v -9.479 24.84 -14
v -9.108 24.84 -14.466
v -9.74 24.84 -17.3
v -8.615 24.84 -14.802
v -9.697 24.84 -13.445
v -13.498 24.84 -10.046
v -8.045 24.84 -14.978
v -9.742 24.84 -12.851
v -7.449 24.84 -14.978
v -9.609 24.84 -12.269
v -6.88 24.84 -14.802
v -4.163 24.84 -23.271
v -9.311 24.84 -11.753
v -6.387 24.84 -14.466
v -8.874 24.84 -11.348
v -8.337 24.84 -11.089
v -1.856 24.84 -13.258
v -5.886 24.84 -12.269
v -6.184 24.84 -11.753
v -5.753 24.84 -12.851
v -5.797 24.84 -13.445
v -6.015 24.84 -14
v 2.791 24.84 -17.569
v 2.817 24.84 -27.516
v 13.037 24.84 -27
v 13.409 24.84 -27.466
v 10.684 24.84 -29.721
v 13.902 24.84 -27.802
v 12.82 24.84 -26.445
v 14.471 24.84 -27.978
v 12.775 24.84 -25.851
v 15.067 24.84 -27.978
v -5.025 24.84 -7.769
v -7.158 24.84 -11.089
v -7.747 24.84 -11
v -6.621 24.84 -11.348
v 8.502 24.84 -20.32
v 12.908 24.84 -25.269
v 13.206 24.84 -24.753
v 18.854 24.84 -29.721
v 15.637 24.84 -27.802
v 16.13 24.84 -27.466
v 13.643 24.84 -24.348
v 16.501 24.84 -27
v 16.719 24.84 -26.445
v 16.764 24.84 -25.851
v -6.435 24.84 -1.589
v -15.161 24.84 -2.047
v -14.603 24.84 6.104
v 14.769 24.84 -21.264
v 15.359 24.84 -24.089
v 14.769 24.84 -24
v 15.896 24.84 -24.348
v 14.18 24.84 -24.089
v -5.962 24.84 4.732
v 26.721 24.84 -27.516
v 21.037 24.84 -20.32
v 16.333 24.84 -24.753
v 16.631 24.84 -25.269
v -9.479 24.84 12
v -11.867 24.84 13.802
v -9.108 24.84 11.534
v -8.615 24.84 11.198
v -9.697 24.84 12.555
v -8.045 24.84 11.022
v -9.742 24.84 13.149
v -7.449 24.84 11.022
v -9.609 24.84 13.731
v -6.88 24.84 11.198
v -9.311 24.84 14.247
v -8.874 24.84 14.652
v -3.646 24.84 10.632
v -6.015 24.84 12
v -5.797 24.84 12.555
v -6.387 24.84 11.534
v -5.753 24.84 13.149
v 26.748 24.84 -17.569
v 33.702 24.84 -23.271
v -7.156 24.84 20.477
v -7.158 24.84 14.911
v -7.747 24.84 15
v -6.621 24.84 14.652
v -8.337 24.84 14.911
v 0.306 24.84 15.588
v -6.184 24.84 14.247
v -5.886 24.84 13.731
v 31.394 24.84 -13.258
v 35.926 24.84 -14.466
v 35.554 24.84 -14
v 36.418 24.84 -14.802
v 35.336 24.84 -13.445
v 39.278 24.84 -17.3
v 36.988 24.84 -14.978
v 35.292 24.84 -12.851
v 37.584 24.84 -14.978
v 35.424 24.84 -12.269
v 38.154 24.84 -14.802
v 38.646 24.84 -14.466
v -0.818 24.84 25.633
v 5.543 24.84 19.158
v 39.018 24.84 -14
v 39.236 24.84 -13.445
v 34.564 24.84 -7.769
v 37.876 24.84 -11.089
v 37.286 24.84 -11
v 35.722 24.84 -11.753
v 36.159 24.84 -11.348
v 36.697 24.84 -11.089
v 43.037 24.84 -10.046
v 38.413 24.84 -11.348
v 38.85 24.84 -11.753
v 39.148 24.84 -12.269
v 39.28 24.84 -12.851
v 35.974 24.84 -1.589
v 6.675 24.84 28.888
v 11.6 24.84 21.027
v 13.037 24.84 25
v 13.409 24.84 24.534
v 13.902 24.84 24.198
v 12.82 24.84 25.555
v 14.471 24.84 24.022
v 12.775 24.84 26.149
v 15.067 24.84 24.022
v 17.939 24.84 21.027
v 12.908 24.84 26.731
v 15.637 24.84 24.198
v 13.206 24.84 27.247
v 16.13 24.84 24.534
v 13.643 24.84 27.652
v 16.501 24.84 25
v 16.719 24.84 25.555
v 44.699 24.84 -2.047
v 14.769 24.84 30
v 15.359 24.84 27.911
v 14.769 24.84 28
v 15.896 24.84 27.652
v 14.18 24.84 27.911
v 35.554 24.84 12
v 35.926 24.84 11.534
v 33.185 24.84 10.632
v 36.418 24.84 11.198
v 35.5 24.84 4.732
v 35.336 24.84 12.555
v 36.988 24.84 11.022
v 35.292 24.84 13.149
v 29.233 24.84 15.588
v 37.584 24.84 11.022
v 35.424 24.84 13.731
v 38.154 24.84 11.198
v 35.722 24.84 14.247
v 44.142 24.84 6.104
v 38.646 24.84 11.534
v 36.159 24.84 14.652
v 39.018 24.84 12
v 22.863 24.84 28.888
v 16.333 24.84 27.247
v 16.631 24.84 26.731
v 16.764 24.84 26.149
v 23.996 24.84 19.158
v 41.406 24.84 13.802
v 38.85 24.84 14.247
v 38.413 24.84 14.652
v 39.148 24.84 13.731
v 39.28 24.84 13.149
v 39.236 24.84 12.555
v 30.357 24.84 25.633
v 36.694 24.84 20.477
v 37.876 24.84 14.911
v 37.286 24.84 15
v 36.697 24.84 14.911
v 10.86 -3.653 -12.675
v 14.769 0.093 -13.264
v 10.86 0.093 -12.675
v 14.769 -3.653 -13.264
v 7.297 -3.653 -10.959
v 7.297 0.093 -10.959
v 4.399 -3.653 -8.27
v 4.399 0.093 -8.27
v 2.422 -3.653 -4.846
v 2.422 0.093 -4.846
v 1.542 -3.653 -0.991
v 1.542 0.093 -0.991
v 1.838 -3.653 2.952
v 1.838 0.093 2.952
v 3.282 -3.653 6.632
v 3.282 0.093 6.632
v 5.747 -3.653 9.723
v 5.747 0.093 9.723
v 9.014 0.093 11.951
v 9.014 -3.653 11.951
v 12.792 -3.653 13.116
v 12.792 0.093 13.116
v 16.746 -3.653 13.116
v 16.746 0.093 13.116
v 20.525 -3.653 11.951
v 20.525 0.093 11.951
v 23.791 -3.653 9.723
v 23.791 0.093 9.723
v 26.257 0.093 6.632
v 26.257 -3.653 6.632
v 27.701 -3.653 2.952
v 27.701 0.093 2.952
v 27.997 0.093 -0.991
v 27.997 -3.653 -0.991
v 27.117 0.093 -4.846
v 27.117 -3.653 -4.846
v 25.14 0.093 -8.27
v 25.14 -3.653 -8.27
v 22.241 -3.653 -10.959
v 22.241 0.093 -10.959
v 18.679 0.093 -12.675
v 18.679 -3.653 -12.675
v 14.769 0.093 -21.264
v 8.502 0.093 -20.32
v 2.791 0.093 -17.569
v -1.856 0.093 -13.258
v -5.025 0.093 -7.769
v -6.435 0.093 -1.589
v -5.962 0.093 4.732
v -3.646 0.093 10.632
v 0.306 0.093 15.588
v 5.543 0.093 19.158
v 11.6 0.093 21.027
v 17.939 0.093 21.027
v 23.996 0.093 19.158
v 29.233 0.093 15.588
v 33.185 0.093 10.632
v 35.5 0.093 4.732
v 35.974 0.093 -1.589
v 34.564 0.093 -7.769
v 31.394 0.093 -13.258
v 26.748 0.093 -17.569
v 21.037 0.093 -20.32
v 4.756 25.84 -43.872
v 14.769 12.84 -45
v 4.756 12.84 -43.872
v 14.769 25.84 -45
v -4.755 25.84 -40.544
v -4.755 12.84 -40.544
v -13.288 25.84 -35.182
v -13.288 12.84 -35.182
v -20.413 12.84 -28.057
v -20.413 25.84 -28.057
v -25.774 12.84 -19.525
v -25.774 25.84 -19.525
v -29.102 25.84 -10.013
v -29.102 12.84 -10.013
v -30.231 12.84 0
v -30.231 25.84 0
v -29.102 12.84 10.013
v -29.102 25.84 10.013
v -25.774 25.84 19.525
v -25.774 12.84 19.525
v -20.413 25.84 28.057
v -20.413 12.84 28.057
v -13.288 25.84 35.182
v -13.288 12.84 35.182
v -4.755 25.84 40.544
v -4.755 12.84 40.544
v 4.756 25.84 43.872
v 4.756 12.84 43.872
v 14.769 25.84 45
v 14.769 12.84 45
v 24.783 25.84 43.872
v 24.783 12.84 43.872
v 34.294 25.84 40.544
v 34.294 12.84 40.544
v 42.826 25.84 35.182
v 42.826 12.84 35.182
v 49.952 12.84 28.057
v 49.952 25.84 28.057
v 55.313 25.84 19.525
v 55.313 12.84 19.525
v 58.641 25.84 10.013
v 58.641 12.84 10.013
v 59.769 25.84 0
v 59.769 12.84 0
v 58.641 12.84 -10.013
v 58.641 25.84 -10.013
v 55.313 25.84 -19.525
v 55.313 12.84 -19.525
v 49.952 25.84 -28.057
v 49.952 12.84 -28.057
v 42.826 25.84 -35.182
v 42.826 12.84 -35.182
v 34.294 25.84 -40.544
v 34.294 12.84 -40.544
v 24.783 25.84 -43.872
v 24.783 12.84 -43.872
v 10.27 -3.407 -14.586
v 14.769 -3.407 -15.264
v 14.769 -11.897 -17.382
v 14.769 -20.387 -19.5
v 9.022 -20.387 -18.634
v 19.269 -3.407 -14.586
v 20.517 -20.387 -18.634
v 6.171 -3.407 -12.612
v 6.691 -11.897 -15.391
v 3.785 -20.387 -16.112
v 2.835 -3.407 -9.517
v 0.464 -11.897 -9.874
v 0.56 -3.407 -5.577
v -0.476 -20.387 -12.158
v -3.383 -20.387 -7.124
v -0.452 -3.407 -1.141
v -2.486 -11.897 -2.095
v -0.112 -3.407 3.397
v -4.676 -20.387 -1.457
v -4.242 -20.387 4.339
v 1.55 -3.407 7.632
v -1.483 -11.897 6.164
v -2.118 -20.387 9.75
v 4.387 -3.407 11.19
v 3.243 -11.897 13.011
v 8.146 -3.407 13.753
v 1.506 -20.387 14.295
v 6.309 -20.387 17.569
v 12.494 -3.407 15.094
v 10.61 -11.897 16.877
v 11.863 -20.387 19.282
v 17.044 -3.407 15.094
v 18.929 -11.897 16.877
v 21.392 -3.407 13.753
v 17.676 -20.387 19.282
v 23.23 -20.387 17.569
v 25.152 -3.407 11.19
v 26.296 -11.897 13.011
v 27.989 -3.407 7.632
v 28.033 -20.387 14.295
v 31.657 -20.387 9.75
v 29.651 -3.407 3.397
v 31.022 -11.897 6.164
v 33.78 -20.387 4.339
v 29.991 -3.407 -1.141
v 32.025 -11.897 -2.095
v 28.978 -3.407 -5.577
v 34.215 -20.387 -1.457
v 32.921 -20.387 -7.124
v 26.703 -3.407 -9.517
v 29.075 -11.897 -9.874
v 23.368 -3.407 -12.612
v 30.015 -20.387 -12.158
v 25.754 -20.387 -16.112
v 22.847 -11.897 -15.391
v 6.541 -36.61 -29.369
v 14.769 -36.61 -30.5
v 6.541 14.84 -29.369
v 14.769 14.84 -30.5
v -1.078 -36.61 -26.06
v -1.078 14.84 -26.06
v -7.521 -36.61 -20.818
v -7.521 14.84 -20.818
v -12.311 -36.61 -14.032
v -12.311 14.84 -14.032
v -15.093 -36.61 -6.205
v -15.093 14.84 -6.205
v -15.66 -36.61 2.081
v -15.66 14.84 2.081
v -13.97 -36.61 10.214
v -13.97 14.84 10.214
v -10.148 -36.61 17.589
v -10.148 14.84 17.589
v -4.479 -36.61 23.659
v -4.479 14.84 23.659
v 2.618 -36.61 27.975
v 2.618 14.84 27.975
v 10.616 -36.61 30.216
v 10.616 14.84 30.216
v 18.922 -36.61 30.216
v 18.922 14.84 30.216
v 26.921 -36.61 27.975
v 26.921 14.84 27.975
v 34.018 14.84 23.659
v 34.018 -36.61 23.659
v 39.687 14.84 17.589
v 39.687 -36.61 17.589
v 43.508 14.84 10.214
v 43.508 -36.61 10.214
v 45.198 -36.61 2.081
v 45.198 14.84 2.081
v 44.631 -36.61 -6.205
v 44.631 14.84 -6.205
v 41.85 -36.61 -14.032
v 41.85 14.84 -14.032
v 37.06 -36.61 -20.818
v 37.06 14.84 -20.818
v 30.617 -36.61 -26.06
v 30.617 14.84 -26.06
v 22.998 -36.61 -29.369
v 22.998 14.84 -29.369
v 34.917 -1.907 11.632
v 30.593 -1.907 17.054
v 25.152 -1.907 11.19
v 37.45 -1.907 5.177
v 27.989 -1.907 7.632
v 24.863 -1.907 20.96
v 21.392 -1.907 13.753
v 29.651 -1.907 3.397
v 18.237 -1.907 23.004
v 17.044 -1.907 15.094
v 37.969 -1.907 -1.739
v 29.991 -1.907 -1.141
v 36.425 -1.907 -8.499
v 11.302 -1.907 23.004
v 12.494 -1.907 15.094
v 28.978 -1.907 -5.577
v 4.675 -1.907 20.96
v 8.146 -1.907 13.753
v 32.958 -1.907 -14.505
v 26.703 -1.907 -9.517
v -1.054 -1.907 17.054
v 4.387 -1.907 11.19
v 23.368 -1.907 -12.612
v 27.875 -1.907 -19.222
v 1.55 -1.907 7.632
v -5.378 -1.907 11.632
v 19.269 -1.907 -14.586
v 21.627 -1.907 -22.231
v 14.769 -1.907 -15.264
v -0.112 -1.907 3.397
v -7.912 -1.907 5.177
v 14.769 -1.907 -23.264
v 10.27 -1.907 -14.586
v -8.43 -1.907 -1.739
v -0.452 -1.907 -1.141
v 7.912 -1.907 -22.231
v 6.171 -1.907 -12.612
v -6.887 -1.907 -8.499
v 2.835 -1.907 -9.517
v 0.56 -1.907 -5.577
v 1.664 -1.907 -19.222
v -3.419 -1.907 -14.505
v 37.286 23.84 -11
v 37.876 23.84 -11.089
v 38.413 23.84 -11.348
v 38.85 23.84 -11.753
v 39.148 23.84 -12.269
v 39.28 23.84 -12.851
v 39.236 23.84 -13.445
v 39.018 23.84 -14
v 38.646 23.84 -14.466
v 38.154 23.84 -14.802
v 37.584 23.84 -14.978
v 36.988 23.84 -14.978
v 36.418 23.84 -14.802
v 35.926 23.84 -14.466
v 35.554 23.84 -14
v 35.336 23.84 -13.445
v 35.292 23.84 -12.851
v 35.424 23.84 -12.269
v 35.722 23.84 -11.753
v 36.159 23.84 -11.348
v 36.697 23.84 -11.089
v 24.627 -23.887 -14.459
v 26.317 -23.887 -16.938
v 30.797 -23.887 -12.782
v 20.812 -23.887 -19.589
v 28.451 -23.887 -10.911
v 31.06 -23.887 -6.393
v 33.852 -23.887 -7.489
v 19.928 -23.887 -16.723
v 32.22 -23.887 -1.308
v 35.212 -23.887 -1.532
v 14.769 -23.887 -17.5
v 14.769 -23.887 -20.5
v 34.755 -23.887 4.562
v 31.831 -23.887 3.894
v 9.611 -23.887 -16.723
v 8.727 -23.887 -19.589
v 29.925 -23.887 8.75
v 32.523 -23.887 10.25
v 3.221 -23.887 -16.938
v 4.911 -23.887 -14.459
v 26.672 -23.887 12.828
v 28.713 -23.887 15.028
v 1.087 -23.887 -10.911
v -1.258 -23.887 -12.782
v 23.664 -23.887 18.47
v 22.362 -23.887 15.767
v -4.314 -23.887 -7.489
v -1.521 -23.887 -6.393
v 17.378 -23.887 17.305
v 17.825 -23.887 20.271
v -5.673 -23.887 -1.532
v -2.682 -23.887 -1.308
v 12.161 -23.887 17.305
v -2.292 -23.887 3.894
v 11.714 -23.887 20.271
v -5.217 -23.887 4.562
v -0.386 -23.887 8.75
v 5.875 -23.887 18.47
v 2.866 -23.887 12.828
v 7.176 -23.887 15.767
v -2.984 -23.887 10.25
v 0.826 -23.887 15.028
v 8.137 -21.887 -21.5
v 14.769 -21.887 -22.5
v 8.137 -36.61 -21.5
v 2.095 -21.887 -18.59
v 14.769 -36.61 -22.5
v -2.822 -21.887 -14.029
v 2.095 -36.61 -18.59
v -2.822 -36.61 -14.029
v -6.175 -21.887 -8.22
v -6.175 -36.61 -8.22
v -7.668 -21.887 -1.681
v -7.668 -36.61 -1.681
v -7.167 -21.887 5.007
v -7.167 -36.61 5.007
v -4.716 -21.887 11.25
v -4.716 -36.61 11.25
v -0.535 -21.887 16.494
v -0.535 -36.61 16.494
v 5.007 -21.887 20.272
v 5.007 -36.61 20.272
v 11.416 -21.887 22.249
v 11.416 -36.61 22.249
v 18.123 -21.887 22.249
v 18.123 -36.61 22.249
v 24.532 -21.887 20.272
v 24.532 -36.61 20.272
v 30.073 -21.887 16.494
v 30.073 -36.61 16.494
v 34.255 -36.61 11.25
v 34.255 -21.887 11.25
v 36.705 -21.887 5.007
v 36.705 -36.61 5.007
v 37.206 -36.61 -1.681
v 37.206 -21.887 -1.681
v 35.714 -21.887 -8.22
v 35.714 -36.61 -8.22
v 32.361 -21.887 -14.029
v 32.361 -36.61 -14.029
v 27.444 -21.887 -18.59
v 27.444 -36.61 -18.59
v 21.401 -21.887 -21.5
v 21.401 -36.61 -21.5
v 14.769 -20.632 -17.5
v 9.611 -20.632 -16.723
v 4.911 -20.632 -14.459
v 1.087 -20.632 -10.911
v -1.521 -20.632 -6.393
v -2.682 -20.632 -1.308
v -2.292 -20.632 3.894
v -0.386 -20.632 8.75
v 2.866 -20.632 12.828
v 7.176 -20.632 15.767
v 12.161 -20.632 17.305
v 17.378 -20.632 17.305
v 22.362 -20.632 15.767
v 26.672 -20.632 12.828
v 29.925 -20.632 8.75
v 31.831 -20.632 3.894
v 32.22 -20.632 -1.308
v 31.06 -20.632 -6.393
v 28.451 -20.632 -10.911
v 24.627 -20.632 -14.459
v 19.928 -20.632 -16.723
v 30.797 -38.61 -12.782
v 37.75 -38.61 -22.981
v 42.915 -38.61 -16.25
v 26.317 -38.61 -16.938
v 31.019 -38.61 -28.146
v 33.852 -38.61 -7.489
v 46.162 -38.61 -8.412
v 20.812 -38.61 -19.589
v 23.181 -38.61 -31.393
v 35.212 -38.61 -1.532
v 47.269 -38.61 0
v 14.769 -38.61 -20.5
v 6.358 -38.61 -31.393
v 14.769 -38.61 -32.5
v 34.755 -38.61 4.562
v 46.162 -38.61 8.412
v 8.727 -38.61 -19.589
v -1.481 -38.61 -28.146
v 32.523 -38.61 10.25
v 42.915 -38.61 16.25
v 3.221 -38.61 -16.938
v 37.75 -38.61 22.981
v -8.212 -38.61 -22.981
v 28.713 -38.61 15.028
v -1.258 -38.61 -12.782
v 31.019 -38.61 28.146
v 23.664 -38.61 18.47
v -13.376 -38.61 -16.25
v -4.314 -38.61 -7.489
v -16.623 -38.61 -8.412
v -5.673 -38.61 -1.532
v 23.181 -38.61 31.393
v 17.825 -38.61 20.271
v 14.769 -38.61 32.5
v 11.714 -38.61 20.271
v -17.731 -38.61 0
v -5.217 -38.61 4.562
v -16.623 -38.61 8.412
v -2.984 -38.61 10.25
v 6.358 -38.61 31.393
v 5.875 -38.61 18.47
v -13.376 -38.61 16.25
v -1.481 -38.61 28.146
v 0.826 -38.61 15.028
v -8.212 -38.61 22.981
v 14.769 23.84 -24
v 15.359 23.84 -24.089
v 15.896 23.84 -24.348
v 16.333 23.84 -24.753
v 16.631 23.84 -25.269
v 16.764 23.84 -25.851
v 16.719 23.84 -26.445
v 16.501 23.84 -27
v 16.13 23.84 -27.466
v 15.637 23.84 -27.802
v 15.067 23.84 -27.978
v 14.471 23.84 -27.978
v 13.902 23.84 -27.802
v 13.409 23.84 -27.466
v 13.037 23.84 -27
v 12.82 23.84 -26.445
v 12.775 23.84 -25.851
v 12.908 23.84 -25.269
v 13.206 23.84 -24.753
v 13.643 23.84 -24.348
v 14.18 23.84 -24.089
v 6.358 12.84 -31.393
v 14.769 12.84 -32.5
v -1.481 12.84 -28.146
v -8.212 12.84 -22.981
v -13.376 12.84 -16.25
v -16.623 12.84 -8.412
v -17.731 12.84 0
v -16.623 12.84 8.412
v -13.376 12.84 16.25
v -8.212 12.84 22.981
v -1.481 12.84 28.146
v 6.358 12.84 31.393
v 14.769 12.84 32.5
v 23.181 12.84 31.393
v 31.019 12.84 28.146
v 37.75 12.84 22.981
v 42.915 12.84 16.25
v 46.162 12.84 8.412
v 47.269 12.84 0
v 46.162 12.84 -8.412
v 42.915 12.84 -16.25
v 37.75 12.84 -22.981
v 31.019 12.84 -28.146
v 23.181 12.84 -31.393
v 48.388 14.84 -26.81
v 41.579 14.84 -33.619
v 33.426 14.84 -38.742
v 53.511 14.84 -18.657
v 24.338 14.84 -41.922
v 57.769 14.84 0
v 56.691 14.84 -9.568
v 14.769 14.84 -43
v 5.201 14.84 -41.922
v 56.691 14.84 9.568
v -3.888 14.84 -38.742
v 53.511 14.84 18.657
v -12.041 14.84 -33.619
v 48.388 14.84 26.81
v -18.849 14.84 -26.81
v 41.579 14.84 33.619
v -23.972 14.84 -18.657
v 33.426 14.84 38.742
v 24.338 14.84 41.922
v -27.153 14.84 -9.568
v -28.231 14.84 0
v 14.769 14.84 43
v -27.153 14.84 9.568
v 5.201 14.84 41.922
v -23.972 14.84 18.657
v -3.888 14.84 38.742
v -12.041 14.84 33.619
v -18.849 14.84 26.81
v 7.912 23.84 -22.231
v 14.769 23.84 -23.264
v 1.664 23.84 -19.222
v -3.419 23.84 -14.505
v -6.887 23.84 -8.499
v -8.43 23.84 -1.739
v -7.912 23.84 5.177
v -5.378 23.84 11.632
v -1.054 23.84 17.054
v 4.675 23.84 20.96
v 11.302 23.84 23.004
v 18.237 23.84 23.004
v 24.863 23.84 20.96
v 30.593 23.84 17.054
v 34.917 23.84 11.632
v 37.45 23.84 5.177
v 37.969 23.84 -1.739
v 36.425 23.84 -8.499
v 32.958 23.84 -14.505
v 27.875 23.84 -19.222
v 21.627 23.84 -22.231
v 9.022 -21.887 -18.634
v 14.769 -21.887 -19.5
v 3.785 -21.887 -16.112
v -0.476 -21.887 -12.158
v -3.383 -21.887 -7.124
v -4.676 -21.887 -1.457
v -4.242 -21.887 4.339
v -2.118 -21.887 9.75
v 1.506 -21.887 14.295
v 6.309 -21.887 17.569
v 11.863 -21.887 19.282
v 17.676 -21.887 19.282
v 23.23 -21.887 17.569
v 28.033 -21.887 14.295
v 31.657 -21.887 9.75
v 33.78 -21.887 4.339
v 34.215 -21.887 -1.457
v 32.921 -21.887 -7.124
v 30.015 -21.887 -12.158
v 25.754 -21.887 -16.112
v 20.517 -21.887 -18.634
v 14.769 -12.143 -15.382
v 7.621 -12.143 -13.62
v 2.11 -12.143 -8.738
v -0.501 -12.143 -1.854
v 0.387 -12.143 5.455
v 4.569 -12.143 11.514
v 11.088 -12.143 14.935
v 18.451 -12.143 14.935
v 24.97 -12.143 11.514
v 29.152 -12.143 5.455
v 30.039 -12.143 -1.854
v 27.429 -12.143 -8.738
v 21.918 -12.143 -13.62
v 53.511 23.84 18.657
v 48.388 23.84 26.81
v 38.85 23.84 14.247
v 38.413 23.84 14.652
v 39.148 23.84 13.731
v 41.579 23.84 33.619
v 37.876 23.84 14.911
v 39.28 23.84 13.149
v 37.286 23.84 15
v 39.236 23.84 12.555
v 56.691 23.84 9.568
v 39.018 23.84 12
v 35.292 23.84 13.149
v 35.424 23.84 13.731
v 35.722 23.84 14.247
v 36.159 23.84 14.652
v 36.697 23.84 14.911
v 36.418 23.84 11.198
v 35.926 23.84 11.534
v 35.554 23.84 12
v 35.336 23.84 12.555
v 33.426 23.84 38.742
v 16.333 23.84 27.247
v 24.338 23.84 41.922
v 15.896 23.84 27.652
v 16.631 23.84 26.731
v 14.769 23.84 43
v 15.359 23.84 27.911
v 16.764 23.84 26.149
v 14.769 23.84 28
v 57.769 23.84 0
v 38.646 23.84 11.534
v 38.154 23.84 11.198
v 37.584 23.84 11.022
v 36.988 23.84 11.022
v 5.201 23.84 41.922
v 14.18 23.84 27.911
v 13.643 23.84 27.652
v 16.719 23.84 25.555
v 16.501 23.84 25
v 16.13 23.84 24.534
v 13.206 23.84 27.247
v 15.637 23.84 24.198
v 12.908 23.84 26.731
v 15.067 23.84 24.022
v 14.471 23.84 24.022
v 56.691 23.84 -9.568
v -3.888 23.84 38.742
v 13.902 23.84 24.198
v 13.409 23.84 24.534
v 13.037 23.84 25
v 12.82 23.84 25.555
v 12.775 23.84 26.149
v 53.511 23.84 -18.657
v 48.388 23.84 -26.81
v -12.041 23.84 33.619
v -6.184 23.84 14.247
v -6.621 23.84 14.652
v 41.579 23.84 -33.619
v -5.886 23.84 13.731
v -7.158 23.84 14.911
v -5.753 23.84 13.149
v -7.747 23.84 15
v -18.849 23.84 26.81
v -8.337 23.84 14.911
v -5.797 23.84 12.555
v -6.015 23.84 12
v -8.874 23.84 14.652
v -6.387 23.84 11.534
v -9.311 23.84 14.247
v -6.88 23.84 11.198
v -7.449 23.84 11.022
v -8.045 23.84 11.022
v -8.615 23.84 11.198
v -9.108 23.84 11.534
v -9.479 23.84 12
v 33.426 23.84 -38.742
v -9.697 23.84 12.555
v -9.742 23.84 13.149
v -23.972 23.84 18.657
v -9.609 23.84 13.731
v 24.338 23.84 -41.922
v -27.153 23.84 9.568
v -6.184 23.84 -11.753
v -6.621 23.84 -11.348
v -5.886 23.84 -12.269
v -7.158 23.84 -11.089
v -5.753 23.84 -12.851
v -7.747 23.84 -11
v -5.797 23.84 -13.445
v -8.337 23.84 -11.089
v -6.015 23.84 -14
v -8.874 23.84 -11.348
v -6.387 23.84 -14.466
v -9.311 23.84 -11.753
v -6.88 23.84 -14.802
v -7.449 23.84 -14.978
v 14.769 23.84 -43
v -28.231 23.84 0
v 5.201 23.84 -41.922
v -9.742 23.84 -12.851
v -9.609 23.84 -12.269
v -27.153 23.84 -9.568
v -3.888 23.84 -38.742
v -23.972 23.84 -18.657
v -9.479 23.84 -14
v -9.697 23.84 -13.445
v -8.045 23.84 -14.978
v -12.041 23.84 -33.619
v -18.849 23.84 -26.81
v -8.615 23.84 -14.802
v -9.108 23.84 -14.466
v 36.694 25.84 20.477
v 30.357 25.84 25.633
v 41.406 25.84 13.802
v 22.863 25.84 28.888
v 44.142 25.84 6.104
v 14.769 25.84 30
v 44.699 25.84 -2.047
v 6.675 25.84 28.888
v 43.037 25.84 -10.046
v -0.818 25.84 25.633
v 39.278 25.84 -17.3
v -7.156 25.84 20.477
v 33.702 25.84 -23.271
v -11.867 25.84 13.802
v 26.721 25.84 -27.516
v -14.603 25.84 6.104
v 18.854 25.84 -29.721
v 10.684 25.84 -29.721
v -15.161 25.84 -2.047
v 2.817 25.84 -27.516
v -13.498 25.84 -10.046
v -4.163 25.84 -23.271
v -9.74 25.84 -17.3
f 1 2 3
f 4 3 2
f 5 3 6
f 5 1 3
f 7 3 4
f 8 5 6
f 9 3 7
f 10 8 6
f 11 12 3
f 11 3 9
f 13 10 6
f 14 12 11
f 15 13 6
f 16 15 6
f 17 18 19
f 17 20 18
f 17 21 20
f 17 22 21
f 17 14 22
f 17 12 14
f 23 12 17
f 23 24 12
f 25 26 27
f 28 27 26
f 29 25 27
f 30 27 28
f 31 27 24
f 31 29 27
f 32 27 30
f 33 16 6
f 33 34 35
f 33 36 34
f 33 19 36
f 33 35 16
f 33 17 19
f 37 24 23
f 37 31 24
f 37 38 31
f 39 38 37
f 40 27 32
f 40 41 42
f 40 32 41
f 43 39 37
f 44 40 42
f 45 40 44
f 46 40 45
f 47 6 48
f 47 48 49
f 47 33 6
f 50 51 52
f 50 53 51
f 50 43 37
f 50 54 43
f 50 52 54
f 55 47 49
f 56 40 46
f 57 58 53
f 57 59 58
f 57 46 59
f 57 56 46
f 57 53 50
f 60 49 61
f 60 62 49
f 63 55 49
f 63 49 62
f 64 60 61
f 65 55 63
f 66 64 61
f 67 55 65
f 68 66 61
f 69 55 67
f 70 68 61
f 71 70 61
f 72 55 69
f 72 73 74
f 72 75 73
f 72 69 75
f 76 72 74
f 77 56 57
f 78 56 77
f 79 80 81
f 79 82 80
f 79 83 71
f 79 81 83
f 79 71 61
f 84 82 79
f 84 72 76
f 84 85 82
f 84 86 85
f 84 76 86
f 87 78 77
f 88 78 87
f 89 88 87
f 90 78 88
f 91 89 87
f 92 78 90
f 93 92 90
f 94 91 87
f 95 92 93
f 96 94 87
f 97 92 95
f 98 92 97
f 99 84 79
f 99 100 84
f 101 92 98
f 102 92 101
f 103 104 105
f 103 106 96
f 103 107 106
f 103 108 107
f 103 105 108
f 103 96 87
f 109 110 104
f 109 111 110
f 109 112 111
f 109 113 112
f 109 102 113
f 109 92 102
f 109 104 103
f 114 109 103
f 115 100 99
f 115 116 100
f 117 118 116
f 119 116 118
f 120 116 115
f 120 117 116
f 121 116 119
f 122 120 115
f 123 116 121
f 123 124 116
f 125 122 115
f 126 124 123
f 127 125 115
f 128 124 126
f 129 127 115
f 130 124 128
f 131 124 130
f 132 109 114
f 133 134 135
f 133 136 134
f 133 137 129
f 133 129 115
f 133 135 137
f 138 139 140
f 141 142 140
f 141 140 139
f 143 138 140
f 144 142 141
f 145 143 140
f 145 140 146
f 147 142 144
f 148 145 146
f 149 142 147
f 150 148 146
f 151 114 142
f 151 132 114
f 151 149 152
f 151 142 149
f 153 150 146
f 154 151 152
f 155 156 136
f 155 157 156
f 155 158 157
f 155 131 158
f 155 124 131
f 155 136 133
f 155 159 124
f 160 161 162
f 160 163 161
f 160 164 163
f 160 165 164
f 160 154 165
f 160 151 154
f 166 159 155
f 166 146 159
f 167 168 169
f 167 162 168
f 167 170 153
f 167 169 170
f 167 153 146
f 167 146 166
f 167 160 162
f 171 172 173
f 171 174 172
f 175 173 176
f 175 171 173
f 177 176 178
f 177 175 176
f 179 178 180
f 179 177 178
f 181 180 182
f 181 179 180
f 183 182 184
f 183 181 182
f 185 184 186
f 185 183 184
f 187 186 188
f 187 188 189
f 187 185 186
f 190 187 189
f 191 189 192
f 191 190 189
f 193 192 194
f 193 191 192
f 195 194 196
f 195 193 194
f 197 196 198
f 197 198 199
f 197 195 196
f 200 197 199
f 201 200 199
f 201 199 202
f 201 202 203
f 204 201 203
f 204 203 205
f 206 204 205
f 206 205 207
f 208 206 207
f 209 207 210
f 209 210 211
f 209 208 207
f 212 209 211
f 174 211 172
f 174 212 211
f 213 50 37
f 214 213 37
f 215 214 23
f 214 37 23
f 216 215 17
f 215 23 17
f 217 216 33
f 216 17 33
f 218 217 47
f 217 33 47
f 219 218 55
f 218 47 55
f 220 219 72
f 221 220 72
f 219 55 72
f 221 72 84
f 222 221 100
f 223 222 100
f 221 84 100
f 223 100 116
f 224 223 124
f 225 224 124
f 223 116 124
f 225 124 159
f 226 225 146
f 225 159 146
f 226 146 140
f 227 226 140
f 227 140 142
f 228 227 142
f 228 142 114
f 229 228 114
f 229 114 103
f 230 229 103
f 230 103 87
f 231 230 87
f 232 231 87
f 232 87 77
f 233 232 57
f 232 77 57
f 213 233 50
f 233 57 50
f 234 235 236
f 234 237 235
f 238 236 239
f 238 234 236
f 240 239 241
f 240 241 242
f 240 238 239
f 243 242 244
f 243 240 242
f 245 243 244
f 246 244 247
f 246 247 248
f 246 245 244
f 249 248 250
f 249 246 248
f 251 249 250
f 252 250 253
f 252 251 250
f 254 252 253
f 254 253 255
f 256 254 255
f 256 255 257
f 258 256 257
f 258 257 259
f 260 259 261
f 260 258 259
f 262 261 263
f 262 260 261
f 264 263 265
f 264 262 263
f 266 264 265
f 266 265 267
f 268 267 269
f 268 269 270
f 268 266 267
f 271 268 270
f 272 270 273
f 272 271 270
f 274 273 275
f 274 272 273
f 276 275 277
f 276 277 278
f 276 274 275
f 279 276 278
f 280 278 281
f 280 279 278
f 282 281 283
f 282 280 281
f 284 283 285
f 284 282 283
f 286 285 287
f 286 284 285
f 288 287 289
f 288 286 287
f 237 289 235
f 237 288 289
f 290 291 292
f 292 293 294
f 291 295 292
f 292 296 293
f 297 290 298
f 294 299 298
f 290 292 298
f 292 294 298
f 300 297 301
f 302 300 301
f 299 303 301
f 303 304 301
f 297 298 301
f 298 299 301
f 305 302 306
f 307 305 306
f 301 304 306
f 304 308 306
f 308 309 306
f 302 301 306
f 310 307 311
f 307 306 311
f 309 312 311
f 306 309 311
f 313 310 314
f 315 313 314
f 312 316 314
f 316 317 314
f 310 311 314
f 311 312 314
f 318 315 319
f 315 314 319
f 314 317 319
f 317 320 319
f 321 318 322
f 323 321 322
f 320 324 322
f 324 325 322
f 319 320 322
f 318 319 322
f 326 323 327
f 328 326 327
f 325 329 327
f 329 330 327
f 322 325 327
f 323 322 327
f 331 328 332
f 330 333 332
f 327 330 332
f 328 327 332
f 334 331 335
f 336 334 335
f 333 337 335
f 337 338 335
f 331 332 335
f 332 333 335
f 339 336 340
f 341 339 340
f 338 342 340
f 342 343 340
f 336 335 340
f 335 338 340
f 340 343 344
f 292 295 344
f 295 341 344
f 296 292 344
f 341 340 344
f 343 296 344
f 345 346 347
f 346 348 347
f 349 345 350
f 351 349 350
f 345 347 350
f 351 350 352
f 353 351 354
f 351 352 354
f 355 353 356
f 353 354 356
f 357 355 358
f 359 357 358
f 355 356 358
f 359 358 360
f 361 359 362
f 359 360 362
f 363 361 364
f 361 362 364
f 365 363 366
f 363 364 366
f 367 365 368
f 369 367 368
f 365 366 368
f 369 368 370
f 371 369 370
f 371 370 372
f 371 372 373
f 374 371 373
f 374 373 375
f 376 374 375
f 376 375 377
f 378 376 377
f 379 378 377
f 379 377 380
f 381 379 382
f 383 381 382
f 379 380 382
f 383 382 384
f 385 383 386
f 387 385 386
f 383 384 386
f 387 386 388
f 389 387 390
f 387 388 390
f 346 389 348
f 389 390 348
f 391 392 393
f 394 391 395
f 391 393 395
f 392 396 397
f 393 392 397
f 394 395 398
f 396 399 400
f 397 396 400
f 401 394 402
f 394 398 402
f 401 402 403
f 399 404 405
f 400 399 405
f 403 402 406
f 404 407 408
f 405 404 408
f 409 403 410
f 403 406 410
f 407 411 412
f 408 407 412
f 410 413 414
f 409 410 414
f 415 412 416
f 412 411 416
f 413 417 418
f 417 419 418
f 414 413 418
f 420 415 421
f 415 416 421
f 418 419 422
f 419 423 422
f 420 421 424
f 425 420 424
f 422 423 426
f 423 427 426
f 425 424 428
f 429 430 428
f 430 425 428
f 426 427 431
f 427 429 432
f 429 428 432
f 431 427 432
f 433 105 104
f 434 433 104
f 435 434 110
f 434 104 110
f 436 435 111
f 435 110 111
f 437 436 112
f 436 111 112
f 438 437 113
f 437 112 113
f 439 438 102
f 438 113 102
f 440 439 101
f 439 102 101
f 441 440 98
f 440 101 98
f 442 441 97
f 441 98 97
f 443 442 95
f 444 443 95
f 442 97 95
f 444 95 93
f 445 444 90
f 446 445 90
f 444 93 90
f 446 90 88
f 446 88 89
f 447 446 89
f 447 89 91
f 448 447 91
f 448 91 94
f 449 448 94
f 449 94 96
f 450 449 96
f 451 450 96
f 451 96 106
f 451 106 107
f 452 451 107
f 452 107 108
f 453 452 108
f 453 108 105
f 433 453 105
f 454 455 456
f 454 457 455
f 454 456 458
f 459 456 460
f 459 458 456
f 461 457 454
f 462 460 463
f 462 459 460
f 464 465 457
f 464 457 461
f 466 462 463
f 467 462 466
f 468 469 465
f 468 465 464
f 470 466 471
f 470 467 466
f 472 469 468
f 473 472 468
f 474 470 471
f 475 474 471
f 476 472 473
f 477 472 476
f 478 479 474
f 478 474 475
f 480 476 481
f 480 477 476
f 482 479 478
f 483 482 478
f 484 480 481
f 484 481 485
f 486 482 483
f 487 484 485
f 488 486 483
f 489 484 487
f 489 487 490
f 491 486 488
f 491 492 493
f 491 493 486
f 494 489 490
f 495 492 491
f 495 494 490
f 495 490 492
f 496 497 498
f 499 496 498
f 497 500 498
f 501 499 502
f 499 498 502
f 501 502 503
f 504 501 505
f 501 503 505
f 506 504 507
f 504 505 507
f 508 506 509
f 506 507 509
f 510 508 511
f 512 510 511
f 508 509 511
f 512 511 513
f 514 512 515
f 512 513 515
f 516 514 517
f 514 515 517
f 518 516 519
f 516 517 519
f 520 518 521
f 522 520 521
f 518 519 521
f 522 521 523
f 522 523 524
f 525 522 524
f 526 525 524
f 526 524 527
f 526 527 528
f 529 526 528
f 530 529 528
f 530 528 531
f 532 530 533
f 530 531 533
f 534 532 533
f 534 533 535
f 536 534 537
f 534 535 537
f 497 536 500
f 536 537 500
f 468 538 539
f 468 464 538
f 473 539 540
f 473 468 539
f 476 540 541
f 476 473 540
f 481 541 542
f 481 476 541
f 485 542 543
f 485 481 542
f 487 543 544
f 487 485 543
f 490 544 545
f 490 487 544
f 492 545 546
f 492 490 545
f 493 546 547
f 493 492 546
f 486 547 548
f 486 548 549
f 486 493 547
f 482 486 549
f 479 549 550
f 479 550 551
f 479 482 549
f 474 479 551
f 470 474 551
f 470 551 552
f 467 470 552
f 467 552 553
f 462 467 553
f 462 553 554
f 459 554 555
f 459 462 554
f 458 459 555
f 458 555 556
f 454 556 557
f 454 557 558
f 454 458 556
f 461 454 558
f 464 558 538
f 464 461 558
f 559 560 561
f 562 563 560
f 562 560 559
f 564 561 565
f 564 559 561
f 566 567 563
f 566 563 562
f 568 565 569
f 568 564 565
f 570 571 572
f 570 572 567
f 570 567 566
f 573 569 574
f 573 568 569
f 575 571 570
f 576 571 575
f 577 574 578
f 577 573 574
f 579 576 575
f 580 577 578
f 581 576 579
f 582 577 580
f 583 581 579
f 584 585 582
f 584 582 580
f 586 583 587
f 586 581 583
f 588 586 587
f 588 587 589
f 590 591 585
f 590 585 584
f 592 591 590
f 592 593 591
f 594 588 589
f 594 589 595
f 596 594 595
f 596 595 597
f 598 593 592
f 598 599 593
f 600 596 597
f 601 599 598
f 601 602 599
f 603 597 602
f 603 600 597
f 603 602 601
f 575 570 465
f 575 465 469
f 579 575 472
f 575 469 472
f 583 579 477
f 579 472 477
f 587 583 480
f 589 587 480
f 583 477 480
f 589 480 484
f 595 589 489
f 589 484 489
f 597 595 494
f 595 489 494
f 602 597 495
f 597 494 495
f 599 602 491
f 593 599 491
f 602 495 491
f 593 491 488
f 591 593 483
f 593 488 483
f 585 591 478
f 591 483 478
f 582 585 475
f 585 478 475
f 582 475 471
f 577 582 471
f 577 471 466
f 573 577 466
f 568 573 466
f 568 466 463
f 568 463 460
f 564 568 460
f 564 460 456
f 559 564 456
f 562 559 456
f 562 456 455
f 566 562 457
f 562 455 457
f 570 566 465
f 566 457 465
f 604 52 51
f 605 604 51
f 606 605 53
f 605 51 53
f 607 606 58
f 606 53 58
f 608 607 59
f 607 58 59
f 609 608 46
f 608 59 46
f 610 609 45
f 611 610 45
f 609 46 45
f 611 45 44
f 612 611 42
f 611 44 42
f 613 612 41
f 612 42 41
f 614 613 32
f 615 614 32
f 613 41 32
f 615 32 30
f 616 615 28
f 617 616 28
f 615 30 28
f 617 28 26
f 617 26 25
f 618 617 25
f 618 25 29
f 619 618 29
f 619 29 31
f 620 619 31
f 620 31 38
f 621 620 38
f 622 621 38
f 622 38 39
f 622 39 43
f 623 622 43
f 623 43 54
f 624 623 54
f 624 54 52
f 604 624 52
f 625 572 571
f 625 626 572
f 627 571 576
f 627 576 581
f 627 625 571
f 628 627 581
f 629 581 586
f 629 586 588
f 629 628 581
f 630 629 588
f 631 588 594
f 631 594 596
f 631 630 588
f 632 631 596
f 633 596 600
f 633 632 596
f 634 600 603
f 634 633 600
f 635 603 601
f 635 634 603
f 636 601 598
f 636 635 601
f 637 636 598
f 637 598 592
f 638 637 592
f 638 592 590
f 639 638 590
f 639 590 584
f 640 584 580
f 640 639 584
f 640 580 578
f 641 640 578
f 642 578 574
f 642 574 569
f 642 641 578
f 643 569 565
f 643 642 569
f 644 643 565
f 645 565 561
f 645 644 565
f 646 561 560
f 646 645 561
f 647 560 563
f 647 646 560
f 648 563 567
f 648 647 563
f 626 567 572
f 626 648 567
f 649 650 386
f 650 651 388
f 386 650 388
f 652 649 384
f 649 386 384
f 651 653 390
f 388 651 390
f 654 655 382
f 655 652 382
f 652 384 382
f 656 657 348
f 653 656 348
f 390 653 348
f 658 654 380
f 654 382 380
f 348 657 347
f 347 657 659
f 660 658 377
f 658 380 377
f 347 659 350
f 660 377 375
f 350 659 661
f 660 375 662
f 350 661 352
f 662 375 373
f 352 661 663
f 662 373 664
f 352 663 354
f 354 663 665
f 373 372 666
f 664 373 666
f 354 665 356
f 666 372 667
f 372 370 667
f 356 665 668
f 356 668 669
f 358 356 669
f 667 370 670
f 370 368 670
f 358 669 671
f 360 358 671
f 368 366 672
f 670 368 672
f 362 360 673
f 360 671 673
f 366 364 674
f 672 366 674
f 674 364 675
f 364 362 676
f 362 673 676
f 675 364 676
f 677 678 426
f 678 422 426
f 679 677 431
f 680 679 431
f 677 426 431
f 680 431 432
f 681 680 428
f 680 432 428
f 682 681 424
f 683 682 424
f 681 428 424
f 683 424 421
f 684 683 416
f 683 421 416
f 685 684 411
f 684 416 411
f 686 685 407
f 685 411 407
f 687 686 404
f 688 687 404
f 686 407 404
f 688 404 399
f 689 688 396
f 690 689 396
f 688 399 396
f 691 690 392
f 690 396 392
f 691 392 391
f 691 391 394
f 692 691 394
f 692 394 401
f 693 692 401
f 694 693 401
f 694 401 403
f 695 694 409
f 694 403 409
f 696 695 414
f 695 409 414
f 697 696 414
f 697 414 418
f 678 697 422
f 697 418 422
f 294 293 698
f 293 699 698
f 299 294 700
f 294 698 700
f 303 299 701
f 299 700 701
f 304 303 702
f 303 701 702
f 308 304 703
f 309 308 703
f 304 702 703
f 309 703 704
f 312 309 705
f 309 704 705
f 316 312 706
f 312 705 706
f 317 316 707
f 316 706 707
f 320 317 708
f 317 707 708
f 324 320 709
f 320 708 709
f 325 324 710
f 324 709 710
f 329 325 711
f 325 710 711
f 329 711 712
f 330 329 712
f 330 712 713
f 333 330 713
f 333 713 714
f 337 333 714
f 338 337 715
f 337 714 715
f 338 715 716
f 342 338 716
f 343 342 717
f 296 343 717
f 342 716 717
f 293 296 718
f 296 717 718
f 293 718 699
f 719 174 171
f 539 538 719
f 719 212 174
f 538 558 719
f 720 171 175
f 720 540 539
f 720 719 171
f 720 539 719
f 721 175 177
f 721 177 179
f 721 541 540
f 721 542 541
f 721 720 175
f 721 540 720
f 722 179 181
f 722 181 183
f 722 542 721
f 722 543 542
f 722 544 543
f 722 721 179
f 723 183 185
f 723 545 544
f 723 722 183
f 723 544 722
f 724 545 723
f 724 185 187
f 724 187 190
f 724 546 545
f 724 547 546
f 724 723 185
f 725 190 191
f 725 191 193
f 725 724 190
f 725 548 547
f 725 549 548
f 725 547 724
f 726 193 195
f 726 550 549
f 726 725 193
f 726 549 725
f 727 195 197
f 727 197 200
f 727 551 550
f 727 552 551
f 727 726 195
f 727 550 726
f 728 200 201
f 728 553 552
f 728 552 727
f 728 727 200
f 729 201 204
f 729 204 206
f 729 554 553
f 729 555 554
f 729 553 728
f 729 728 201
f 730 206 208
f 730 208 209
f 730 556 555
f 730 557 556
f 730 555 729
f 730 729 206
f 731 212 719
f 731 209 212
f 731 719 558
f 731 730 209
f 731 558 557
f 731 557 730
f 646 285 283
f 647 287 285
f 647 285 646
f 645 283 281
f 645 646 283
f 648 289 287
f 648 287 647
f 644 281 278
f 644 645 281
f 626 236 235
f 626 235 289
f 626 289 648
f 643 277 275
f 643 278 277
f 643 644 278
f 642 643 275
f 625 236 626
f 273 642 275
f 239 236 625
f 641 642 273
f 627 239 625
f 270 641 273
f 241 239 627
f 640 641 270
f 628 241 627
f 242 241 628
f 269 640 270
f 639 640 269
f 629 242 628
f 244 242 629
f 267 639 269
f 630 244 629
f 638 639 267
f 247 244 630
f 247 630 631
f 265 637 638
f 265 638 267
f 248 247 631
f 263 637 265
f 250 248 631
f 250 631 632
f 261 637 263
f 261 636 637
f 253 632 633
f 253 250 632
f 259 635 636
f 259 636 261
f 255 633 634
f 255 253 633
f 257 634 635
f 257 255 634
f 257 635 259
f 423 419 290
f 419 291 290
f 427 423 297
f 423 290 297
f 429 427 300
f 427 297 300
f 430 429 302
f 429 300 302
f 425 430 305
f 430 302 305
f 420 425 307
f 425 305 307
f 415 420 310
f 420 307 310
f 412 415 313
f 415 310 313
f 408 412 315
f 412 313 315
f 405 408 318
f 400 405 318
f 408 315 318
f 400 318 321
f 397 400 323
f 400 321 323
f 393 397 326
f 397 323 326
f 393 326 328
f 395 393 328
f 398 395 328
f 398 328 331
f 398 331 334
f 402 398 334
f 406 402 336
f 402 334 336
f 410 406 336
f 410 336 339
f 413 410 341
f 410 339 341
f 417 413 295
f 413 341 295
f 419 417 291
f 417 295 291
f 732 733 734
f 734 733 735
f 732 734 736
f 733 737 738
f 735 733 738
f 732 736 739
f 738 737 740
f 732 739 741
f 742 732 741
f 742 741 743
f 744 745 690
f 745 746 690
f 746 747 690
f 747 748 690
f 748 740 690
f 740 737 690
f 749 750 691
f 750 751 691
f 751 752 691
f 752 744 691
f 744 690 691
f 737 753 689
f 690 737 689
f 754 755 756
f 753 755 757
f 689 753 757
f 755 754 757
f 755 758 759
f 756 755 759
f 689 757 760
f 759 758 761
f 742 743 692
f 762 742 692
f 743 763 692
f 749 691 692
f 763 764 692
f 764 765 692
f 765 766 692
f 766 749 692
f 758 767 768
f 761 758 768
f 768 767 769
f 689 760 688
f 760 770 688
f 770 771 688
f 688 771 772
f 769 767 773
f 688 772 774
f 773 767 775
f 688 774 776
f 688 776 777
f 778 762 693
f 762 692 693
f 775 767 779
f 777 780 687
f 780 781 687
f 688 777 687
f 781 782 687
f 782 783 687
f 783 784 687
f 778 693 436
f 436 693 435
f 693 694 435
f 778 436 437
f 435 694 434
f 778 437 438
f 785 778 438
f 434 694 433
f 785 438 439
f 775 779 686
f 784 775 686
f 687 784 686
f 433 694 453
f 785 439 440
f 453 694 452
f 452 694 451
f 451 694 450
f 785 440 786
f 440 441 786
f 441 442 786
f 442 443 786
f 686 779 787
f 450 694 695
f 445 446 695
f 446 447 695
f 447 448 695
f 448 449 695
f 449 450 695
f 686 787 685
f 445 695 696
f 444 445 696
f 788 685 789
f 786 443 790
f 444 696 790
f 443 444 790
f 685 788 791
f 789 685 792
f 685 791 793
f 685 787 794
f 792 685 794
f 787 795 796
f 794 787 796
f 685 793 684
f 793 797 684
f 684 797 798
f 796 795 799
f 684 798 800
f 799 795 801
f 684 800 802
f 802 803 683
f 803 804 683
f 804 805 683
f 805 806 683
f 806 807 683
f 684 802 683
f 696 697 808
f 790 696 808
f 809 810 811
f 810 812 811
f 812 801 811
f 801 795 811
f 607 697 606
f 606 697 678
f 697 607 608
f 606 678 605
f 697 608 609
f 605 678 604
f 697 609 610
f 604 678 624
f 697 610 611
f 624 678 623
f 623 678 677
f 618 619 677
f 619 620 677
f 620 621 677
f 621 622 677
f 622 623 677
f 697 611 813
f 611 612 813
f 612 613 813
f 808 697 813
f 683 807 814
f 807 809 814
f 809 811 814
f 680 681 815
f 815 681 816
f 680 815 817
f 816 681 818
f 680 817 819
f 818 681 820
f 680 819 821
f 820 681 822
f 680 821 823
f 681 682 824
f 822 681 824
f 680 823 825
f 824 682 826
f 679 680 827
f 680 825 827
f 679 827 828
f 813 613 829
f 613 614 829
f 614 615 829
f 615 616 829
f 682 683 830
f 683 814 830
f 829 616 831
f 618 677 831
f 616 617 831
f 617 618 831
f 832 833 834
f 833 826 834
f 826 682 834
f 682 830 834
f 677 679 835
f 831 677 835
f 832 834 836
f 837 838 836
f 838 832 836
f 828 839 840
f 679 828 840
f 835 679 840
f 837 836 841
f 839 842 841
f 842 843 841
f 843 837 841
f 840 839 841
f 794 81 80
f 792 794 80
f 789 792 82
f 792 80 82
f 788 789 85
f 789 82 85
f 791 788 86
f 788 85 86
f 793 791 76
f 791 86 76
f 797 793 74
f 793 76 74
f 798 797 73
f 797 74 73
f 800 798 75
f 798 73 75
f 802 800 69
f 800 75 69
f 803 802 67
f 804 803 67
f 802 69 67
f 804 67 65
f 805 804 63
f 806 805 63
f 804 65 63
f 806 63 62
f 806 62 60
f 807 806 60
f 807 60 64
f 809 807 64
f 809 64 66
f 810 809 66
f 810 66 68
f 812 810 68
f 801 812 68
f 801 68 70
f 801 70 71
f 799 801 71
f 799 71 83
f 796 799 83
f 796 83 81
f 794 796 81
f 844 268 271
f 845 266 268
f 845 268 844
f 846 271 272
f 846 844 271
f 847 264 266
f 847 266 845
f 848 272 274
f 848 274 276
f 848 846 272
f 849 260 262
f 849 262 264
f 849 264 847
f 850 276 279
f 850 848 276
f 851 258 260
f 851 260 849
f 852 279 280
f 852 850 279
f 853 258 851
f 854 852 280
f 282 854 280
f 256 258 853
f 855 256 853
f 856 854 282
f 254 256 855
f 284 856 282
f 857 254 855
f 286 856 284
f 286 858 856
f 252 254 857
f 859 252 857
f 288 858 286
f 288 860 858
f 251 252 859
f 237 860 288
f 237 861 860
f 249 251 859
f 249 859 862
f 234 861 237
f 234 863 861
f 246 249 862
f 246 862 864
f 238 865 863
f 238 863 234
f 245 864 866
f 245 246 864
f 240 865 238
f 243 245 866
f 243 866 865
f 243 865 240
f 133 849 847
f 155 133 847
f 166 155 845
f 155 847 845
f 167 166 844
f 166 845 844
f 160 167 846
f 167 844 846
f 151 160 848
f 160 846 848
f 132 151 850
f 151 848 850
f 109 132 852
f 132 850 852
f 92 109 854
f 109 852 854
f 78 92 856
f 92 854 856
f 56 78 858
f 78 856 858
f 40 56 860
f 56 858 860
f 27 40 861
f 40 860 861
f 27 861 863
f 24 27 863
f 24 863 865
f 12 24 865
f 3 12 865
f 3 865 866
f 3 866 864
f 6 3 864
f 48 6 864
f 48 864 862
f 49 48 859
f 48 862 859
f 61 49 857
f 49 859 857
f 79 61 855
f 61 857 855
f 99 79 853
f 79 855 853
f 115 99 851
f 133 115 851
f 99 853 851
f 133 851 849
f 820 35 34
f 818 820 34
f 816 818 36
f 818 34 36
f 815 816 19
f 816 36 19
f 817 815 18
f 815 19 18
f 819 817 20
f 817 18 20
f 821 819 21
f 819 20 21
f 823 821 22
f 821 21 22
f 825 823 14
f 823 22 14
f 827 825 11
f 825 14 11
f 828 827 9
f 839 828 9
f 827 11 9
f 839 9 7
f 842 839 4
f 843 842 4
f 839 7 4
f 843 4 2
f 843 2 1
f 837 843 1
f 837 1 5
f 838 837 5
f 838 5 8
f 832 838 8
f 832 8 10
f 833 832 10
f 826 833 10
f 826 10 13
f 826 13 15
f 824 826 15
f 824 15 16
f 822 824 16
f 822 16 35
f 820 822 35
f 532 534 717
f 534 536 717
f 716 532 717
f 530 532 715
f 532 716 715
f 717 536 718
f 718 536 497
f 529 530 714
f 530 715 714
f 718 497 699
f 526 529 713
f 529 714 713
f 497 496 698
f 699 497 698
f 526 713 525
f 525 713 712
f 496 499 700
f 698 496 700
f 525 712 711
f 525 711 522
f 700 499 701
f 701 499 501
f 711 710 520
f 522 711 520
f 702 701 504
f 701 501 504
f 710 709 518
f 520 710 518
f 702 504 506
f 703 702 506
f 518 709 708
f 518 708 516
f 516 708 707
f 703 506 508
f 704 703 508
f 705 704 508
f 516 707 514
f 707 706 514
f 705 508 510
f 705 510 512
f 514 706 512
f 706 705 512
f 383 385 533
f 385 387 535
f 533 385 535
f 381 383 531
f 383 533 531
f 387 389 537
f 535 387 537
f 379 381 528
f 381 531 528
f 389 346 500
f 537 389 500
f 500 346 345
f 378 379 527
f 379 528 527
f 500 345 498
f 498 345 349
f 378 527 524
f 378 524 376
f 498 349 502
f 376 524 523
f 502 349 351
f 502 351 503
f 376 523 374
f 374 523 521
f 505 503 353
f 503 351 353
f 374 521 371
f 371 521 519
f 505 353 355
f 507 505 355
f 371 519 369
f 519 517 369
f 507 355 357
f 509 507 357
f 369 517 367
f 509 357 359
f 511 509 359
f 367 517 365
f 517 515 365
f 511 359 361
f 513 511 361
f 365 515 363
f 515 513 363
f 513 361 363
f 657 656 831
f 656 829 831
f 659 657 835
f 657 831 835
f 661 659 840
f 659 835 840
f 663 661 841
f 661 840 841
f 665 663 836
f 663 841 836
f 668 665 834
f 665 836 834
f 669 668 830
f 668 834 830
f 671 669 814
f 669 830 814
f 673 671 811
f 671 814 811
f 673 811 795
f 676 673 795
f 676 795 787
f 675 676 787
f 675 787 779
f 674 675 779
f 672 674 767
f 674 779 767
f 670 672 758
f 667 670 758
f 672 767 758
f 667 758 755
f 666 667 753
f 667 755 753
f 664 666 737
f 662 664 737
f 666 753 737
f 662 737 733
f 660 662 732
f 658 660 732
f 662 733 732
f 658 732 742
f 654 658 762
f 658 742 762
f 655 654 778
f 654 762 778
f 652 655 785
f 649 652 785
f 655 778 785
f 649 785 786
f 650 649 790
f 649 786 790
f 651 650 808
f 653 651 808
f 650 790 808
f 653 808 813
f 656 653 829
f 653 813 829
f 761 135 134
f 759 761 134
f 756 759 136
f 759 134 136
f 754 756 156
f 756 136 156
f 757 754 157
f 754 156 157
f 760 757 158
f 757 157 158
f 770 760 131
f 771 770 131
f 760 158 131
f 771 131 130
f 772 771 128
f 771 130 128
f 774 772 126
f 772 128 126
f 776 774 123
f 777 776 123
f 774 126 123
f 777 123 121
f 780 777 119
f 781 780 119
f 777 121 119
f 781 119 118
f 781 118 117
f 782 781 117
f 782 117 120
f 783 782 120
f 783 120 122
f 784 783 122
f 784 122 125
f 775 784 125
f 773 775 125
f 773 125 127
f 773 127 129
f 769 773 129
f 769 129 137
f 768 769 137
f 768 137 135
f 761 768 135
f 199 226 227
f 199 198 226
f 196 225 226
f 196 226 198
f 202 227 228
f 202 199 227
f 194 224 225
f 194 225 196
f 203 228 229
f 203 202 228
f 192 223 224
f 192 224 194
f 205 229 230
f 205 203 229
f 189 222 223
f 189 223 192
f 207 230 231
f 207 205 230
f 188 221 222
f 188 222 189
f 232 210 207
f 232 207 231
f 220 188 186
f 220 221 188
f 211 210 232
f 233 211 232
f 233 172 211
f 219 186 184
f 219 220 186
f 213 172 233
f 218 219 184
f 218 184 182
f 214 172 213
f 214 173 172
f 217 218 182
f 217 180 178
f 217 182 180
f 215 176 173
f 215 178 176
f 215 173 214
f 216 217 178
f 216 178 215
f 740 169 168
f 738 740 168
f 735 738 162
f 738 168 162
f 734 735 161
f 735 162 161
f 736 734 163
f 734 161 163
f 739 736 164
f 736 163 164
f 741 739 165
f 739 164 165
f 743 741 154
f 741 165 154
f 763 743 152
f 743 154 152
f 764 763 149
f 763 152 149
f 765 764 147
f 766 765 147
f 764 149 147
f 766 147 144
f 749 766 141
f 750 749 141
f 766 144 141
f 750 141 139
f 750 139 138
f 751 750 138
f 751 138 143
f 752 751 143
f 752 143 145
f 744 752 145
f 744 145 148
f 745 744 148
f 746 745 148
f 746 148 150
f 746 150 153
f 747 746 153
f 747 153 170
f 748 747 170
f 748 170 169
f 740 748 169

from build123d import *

# Parameters (mm, degrees)
SKETCH4_R          = 30
CUT_EXTRUDE3_DEPTH = 1
SKETCH5_R          = 2
CUT_EXTRUDE4_DEPTH = 6


with BuildPart() as part:
    # Sketch2 → Revolve-Thin1 (revolve)
    with BuildSketch(Plane.XY, mode=Mode.PRIVATE) as revolve_thin1_sk:
        Polygon((-30.230643129, 25.839523207), (-6.494921795, 25.839523207), (-6.494921795, 21.839523207), (-6.494921795, 0.092953851), (1.505078205, 0.092953851), (1.505078205, -3.652740104), (-2.730643129, -20.632394541), (-2.730643129, -23.886700586), (-5.730643129, -23.886700586), (-5.730643129, -30.625568886), (-5.730643129, -38.610085728), (-17.730643129, -38.610085728), (-17.730643129, 12.839523207), (-30.230643129, 12.839523207), align=None)
        Polygon((-28.230643129, 23.839523207), (-8.494921795, 23.839523207), (-8.494921795, 21.839523207), (-8.494921795, -1.907046149), (-0.494921795, -1.907046149), (-0.494921795, -3.407046149), (-4.730643129, -20.386700586), (-4.730643129, -21.886700586), (-7.730643129, -21.886700586), (-7.730643129, -30.625568886), (-7.730643129, -36.610085728), (-15.730643129, -36.610085728), (-15.730643129, 14.839523207), (-28.230643129, 14.839523207), align=None, mode=Mode.SUBTRACT)
    revolve(revolve_thin1_sk.sketch.rotate(Axis((14.769356871, -26.256134736, 0), (0, 1, 0)), 270), axis=Axis((14.769356871, -26.256134736, 0), (0, 1, 0)))

    # Sketch4 → Cut-Extrude3 (cut)
    with BuildSketch(Plane(origin=(0, 25.839523207, 0), x_dir=(1, 0, 0), z_dir=(0, 1, 0))):
        with Locations(Location((14.769356871, 0, 0), (0, 0, 270))):
            Circle(SKETCH4_R)
    extrude(amount=-CUT_EXTRUDE3_DEPTH, mode=Mode.SUBTRACT)

    # Sketch5 → Cut-Extrude4 (cut)
    with BuildSketch(Plane(origin=(0, 25.839523207, 0), x_dir=(1, 0, 0), z_dir=(0, 1, 0))):
        with Locations(Location((14.769356871, 26, 0), (0, 0, 270))):
            Circle(SKETCH5_R)
        with Locations(Location((37.28601737, 13, 0), (0, 0, 270))):
            Circle(SKETCH5_R)
        with Locations(Location((37.28601737, -13, 0), (0, 0, 270))):
            Circle(SKETCH5_R)
        with Locations(Location((14.769356871, -26, 0), (0, 0, 270))):
            Circle(SKETCH5_R)
        with Locations(Location((-7.747303627, -13, 0), (0, 0, 270))):
            Circle(SKETCH5_R)
        with Locations(Location((-7.747303627, 13, 0), (0, 0, 270))):
            Circle(SKETCH5_R)
    extrude(amount=-CUT_EXTRUDE4_DEPTH, mode=Mode.SUBTRACT)


solid = part.part
